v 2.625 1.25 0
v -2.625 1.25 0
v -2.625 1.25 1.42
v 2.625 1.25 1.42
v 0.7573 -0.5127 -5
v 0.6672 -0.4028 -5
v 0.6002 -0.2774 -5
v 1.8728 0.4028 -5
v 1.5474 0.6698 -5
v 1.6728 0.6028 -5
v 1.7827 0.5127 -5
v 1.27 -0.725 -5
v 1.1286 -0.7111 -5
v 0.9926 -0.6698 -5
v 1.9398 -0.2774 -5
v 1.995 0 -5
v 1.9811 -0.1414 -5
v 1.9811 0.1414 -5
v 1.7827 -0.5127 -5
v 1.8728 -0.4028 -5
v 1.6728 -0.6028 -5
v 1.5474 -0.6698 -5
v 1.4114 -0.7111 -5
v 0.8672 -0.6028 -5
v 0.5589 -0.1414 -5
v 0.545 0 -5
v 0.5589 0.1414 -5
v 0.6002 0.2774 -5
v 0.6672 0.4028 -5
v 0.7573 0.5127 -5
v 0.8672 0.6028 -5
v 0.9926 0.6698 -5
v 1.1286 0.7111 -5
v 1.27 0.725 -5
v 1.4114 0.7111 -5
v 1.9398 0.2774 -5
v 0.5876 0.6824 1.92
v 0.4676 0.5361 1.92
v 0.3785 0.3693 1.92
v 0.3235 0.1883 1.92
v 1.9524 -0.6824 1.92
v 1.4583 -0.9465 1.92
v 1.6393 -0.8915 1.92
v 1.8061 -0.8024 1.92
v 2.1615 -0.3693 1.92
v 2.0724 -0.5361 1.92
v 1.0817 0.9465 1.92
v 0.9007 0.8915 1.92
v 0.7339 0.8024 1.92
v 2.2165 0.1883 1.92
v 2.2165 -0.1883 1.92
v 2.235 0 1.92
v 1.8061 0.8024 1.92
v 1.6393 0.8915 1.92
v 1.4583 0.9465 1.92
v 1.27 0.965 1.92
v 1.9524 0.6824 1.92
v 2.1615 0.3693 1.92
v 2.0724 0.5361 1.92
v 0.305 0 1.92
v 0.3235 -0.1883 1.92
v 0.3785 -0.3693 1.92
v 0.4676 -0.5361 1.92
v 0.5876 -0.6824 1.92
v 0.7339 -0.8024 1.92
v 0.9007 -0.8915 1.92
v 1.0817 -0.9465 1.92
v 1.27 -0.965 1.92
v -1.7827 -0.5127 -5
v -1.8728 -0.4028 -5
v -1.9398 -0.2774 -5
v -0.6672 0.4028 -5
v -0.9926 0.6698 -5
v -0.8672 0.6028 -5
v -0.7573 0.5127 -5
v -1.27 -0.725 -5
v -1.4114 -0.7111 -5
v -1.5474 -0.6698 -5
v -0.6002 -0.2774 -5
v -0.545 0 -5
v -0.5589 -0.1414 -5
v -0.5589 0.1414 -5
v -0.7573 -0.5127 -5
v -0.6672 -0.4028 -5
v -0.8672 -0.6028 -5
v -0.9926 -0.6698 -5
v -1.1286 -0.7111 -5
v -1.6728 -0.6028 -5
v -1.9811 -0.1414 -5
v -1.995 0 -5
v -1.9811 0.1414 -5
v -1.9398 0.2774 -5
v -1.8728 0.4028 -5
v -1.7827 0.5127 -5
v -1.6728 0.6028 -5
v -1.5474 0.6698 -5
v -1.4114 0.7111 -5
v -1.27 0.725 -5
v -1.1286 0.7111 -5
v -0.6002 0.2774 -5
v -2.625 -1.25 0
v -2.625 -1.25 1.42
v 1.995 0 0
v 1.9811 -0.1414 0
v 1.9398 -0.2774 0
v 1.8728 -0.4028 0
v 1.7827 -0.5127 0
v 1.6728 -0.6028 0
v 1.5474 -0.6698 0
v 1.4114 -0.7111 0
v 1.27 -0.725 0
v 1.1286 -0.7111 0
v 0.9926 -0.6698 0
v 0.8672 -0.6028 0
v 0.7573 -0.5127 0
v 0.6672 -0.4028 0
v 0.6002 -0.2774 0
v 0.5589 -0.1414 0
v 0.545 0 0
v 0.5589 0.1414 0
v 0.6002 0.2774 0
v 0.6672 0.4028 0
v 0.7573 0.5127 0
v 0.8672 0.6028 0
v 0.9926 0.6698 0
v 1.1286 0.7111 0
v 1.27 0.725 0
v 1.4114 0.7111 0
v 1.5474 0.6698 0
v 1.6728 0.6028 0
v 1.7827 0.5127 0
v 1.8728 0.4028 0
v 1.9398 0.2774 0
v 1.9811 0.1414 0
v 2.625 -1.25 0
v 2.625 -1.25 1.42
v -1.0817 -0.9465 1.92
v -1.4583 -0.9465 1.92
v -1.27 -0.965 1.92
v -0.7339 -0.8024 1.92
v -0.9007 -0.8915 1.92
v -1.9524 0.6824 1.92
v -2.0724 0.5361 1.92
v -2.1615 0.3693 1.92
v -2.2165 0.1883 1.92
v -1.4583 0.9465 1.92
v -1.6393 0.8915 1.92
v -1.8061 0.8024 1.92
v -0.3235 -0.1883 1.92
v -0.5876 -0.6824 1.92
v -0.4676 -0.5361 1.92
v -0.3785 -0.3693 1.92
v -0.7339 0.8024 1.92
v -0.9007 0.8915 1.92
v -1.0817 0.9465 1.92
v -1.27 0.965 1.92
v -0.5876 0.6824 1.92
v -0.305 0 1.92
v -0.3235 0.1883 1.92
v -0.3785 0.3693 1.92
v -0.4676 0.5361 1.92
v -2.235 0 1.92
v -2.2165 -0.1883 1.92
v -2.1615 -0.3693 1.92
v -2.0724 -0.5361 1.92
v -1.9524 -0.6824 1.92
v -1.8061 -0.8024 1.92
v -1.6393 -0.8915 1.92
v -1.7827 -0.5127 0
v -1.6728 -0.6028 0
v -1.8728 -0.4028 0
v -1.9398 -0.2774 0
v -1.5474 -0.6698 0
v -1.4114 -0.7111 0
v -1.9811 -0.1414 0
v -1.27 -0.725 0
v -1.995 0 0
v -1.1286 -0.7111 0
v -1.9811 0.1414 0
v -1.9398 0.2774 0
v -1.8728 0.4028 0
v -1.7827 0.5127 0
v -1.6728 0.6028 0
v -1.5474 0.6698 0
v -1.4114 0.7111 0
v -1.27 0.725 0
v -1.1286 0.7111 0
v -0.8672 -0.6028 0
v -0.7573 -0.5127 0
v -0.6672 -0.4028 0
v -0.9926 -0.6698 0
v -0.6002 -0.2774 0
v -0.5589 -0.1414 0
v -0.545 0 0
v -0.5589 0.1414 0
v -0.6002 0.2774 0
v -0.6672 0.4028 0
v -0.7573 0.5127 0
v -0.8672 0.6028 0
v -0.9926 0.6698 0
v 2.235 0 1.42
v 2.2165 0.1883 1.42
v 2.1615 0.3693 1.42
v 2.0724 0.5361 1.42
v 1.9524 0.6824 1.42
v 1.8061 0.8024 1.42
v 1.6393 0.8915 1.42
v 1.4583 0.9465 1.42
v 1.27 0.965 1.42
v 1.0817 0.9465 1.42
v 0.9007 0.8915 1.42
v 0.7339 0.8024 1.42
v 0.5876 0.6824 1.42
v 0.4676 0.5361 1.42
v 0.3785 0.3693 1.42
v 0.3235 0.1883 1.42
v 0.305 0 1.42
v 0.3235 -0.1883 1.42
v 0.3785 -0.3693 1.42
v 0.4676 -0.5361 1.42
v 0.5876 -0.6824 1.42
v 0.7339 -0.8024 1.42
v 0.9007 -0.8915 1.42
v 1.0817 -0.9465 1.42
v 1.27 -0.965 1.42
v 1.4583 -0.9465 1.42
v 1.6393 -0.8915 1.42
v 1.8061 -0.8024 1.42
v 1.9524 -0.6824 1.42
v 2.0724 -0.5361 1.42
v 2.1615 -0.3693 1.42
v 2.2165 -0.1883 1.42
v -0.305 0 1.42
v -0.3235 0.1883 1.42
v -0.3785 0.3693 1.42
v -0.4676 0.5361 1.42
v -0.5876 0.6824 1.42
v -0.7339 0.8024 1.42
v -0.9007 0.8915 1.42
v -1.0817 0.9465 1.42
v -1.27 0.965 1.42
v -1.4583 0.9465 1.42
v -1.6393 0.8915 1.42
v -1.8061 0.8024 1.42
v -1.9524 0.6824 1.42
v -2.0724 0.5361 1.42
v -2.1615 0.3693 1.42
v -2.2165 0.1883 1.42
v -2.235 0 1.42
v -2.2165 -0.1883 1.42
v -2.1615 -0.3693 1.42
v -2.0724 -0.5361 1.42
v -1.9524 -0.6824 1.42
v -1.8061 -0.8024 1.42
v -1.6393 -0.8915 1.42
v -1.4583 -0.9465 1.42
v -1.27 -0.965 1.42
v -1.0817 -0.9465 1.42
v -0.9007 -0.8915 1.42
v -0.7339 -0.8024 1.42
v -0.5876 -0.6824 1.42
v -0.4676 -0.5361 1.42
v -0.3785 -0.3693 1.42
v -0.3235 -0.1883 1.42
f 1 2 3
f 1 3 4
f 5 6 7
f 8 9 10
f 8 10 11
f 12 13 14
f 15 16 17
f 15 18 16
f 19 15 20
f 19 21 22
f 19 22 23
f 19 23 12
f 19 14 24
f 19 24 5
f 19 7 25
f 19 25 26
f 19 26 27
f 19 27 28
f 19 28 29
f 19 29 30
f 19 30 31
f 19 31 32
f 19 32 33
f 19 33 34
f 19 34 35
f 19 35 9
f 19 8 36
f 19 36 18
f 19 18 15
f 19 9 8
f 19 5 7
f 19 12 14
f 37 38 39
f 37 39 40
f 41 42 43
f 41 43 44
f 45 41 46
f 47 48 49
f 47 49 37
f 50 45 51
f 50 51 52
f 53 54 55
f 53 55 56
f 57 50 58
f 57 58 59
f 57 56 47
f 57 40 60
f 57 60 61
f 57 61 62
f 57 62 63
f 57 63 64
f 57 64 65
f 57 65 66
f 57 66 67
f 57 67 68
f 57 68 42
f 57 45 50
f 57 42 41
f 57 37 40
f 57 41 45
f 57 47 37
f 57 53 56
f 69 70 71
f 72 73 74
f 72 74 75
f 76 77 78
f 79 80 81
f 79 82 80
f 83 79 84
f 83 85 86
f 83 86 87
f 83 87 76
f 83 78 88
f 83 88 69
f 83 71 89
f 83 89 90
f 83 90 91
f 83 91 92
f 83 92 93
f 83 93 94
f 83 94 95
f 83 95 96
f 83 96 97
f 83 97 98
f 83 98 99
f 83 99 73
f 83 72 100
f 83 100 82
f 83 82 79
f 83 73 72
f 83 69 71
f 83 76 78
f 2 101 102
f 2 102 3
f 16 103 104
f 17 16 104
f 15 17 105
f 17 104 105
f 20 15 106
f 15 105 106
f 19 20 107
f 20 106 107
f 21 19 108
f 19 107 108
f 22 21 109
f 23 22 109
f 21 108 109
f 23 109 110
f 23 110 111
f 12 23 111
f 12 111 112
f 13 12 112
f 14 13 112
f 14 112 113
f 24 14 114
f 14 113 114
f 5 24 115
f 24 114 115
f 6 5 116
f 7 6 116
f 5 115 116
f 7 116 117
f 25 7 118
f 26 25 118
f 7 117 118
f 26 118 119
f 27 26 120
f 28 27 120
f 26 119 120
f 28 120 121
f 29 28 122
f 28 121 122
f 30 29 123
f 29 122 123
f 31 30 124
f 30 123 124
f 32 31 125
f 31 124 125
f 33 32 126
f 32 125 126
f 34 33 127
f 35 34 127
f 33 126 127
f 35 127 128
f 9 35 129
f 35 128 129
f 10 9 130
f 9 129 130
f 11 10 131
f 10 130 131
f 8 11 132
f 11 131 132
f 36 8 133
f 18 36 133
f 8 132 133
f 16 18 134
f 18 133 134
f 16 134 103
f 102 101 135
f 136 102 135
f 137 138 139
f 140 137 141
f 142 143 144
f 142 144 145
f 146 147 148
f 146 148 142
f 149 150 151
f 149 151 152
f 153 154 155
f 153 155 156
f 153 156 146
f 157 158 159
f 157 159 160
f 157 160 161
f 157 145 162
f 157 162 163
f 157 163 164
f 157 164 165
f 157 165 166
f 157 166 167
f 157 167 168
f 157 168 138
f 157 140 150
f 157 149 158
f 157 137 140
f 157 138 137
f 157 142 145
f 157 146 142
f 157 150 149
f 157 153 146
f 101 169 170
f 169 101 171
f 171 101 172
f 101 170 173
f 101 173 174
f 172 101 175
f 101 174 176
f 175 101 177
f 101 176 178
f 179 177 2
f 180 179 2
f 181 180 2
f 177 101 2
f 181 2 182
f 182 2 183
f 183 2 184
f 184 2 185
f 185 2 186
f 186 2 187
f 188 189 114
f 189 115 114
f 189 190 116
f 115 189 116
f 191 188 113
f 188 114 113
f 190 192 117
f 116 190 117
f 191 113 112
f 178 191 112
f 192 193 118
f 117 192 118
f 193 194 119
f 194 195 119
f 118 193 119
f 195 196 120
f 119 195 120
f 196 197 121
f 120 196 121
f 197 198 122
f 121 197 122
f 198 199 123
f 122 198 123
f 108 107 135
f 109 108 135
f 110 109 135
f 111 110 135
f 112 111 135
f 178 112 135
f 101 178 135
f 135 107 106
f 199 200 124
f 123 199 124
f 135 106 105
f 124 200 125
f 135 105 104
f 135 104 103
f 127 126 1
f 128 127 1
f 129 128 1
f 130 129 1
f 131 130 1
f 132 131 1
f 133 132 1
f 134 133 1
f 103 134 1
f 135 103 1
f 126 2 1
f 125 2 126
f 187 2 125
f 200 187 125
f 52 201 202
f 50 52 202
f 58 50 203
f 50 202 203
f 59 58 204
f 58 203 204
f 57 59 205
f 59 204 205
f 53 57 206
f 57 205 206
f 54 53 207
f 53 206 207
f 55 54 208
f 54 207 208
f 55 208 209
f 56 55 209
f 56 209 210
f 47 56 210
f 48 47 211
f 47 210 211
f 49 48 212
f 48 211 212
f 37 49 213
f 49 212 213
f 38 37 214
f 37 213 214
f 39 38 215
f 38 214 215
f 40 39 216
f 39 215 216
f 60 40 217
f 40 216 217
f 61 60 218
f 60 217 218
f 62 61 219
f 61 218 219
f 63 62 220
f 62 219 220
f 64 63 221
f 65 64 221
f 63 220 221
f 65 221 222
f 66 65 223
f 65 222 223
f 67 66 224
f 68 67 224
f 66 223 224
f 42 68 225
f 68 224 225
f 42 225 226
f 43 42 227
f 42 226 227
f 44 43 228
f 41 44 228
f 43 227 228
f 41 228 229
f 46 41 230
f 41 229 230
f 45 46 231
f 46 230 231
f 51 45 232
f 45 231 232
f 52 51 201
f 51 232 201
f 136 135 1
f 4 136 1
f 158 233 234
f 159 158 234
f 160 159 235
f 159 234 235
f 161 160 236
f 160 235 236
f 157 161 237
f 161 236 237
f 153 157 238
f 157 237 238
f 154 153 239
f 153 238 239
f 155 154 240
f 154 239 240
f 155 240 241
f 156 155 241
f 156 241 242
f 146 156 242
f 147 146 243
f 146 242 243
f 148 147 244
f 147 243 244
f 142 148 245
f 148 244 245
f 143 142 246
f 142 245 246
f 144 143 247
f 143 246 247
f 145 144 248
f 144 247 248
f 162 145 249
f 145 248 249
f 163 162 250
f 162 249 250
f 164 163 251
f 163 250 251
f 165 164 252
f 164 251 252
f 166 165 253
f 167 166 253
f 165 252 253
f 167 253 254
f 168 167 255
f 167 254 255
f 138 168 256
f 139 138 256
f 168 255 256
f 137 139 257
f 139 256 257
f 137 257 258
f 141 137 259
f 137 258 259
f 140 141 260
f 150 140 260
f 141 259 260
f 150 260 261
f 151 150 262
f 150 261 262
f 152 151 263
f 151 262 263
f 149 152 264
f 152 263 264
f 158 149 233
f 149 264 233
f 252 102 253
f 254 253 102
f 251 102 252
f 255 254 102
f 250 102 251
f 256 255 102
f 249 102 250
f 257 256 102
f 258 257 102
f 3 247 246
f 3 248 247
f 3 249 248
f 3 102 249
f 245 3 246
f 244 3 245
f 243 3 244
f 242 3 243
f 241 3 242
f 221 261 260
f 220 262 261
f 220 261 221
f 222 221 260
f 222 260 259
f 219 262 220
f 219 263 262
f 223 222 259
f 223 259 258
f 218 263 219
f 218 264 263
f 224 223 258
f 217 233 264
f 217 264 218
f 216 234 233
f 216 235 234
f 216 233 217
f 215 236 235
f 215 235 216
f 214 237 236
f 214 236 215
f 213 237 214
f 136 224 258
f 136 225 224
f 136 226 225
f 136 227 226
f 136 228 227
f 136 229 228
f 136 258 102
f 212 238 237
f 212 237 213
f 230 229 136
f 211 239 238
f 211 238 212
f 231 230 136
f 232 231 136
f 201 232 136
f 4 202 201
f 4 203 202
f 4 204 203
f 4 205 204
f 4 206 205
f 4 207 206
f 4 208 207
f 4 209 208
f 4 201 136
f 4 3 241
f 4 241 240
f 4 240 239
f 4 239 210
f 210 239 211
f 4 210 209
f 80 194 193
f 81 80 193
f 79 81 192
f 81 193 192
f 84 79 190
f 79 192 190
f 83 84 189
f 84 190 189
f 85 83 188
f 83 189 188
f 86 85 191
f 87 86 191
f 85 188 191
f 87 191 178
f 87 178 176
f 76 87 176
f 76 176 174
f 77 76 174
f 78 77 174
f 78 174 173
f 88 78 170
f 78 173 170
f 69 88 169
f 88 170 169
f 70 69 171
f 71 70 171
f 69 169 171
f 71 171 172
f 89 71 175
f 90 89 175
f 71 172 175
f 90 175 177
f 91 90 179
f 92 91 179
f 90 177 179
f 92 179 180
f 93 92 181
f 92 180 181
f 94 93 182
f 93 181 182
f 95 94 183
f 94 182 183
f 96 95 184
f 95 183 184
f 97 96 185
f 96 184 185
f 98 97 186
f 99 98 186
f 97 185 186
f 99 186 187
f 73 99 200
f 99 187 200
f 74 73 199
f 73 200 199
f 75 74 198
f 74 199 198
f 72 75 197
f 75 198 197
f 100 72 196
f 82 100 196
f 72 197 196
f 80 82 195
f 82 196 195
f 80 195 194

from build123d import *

# Parameters (mm, degrees)
SKETCH_1_W      = 5.25
SKETCH_1_H      = 2.5
EXTRUDE_1_DEPTH = 1.42
SKETCH_2_R      = 0.725
EXTRUDE_2_DEPTH = 5
SKETCH_3_R      = 0.965
EXTRUDE_3_DEPTH = 0.5


with BuildPart() as part:
    # ｽｹｯﾁ1 → ﾎﾞｽ - 押し出し1 (new body)
    with BuildSketch(Plane.XY):
        Rectangle(SKETCH_1_W, SKETCH_1_H)
    extrude(amount=EXTRUDE_1_DEPTH)

    # ｽｹｯﾁ2 → ﾎﾞｽ - 押し出し2 (add)
    with BuildSketch(Plane(origin=(0, 0, 0), x_dir=(-1, 0, 0), z_dir=(0, 0, -1))):
        with Locations(Location((-1.27, 0, 0), (0, 0, 180))):
            Circle(SKETCH_2_R)
        with Locations(Location((1.27, 0, 0), (0, 0, 180))):
            Circle(SKETCH_2_R)
    extrude(amount=EXTRUDE_2_DEPTH)

    # ｽｹｯﾁ3 → ﾎﾞｽ - 押し出し3 (add)
    with BuildSketch(Plane.XY.offset(1.42)):
        with Locations((-1.27, 0)):
            Circle(SKETCH_3_R)
        with Locations((1.27, 0)):
            Circle(SKETCH_3_R)
    extrude(amount=EXTRUDE_3_DEPTH)


solid = part.part
